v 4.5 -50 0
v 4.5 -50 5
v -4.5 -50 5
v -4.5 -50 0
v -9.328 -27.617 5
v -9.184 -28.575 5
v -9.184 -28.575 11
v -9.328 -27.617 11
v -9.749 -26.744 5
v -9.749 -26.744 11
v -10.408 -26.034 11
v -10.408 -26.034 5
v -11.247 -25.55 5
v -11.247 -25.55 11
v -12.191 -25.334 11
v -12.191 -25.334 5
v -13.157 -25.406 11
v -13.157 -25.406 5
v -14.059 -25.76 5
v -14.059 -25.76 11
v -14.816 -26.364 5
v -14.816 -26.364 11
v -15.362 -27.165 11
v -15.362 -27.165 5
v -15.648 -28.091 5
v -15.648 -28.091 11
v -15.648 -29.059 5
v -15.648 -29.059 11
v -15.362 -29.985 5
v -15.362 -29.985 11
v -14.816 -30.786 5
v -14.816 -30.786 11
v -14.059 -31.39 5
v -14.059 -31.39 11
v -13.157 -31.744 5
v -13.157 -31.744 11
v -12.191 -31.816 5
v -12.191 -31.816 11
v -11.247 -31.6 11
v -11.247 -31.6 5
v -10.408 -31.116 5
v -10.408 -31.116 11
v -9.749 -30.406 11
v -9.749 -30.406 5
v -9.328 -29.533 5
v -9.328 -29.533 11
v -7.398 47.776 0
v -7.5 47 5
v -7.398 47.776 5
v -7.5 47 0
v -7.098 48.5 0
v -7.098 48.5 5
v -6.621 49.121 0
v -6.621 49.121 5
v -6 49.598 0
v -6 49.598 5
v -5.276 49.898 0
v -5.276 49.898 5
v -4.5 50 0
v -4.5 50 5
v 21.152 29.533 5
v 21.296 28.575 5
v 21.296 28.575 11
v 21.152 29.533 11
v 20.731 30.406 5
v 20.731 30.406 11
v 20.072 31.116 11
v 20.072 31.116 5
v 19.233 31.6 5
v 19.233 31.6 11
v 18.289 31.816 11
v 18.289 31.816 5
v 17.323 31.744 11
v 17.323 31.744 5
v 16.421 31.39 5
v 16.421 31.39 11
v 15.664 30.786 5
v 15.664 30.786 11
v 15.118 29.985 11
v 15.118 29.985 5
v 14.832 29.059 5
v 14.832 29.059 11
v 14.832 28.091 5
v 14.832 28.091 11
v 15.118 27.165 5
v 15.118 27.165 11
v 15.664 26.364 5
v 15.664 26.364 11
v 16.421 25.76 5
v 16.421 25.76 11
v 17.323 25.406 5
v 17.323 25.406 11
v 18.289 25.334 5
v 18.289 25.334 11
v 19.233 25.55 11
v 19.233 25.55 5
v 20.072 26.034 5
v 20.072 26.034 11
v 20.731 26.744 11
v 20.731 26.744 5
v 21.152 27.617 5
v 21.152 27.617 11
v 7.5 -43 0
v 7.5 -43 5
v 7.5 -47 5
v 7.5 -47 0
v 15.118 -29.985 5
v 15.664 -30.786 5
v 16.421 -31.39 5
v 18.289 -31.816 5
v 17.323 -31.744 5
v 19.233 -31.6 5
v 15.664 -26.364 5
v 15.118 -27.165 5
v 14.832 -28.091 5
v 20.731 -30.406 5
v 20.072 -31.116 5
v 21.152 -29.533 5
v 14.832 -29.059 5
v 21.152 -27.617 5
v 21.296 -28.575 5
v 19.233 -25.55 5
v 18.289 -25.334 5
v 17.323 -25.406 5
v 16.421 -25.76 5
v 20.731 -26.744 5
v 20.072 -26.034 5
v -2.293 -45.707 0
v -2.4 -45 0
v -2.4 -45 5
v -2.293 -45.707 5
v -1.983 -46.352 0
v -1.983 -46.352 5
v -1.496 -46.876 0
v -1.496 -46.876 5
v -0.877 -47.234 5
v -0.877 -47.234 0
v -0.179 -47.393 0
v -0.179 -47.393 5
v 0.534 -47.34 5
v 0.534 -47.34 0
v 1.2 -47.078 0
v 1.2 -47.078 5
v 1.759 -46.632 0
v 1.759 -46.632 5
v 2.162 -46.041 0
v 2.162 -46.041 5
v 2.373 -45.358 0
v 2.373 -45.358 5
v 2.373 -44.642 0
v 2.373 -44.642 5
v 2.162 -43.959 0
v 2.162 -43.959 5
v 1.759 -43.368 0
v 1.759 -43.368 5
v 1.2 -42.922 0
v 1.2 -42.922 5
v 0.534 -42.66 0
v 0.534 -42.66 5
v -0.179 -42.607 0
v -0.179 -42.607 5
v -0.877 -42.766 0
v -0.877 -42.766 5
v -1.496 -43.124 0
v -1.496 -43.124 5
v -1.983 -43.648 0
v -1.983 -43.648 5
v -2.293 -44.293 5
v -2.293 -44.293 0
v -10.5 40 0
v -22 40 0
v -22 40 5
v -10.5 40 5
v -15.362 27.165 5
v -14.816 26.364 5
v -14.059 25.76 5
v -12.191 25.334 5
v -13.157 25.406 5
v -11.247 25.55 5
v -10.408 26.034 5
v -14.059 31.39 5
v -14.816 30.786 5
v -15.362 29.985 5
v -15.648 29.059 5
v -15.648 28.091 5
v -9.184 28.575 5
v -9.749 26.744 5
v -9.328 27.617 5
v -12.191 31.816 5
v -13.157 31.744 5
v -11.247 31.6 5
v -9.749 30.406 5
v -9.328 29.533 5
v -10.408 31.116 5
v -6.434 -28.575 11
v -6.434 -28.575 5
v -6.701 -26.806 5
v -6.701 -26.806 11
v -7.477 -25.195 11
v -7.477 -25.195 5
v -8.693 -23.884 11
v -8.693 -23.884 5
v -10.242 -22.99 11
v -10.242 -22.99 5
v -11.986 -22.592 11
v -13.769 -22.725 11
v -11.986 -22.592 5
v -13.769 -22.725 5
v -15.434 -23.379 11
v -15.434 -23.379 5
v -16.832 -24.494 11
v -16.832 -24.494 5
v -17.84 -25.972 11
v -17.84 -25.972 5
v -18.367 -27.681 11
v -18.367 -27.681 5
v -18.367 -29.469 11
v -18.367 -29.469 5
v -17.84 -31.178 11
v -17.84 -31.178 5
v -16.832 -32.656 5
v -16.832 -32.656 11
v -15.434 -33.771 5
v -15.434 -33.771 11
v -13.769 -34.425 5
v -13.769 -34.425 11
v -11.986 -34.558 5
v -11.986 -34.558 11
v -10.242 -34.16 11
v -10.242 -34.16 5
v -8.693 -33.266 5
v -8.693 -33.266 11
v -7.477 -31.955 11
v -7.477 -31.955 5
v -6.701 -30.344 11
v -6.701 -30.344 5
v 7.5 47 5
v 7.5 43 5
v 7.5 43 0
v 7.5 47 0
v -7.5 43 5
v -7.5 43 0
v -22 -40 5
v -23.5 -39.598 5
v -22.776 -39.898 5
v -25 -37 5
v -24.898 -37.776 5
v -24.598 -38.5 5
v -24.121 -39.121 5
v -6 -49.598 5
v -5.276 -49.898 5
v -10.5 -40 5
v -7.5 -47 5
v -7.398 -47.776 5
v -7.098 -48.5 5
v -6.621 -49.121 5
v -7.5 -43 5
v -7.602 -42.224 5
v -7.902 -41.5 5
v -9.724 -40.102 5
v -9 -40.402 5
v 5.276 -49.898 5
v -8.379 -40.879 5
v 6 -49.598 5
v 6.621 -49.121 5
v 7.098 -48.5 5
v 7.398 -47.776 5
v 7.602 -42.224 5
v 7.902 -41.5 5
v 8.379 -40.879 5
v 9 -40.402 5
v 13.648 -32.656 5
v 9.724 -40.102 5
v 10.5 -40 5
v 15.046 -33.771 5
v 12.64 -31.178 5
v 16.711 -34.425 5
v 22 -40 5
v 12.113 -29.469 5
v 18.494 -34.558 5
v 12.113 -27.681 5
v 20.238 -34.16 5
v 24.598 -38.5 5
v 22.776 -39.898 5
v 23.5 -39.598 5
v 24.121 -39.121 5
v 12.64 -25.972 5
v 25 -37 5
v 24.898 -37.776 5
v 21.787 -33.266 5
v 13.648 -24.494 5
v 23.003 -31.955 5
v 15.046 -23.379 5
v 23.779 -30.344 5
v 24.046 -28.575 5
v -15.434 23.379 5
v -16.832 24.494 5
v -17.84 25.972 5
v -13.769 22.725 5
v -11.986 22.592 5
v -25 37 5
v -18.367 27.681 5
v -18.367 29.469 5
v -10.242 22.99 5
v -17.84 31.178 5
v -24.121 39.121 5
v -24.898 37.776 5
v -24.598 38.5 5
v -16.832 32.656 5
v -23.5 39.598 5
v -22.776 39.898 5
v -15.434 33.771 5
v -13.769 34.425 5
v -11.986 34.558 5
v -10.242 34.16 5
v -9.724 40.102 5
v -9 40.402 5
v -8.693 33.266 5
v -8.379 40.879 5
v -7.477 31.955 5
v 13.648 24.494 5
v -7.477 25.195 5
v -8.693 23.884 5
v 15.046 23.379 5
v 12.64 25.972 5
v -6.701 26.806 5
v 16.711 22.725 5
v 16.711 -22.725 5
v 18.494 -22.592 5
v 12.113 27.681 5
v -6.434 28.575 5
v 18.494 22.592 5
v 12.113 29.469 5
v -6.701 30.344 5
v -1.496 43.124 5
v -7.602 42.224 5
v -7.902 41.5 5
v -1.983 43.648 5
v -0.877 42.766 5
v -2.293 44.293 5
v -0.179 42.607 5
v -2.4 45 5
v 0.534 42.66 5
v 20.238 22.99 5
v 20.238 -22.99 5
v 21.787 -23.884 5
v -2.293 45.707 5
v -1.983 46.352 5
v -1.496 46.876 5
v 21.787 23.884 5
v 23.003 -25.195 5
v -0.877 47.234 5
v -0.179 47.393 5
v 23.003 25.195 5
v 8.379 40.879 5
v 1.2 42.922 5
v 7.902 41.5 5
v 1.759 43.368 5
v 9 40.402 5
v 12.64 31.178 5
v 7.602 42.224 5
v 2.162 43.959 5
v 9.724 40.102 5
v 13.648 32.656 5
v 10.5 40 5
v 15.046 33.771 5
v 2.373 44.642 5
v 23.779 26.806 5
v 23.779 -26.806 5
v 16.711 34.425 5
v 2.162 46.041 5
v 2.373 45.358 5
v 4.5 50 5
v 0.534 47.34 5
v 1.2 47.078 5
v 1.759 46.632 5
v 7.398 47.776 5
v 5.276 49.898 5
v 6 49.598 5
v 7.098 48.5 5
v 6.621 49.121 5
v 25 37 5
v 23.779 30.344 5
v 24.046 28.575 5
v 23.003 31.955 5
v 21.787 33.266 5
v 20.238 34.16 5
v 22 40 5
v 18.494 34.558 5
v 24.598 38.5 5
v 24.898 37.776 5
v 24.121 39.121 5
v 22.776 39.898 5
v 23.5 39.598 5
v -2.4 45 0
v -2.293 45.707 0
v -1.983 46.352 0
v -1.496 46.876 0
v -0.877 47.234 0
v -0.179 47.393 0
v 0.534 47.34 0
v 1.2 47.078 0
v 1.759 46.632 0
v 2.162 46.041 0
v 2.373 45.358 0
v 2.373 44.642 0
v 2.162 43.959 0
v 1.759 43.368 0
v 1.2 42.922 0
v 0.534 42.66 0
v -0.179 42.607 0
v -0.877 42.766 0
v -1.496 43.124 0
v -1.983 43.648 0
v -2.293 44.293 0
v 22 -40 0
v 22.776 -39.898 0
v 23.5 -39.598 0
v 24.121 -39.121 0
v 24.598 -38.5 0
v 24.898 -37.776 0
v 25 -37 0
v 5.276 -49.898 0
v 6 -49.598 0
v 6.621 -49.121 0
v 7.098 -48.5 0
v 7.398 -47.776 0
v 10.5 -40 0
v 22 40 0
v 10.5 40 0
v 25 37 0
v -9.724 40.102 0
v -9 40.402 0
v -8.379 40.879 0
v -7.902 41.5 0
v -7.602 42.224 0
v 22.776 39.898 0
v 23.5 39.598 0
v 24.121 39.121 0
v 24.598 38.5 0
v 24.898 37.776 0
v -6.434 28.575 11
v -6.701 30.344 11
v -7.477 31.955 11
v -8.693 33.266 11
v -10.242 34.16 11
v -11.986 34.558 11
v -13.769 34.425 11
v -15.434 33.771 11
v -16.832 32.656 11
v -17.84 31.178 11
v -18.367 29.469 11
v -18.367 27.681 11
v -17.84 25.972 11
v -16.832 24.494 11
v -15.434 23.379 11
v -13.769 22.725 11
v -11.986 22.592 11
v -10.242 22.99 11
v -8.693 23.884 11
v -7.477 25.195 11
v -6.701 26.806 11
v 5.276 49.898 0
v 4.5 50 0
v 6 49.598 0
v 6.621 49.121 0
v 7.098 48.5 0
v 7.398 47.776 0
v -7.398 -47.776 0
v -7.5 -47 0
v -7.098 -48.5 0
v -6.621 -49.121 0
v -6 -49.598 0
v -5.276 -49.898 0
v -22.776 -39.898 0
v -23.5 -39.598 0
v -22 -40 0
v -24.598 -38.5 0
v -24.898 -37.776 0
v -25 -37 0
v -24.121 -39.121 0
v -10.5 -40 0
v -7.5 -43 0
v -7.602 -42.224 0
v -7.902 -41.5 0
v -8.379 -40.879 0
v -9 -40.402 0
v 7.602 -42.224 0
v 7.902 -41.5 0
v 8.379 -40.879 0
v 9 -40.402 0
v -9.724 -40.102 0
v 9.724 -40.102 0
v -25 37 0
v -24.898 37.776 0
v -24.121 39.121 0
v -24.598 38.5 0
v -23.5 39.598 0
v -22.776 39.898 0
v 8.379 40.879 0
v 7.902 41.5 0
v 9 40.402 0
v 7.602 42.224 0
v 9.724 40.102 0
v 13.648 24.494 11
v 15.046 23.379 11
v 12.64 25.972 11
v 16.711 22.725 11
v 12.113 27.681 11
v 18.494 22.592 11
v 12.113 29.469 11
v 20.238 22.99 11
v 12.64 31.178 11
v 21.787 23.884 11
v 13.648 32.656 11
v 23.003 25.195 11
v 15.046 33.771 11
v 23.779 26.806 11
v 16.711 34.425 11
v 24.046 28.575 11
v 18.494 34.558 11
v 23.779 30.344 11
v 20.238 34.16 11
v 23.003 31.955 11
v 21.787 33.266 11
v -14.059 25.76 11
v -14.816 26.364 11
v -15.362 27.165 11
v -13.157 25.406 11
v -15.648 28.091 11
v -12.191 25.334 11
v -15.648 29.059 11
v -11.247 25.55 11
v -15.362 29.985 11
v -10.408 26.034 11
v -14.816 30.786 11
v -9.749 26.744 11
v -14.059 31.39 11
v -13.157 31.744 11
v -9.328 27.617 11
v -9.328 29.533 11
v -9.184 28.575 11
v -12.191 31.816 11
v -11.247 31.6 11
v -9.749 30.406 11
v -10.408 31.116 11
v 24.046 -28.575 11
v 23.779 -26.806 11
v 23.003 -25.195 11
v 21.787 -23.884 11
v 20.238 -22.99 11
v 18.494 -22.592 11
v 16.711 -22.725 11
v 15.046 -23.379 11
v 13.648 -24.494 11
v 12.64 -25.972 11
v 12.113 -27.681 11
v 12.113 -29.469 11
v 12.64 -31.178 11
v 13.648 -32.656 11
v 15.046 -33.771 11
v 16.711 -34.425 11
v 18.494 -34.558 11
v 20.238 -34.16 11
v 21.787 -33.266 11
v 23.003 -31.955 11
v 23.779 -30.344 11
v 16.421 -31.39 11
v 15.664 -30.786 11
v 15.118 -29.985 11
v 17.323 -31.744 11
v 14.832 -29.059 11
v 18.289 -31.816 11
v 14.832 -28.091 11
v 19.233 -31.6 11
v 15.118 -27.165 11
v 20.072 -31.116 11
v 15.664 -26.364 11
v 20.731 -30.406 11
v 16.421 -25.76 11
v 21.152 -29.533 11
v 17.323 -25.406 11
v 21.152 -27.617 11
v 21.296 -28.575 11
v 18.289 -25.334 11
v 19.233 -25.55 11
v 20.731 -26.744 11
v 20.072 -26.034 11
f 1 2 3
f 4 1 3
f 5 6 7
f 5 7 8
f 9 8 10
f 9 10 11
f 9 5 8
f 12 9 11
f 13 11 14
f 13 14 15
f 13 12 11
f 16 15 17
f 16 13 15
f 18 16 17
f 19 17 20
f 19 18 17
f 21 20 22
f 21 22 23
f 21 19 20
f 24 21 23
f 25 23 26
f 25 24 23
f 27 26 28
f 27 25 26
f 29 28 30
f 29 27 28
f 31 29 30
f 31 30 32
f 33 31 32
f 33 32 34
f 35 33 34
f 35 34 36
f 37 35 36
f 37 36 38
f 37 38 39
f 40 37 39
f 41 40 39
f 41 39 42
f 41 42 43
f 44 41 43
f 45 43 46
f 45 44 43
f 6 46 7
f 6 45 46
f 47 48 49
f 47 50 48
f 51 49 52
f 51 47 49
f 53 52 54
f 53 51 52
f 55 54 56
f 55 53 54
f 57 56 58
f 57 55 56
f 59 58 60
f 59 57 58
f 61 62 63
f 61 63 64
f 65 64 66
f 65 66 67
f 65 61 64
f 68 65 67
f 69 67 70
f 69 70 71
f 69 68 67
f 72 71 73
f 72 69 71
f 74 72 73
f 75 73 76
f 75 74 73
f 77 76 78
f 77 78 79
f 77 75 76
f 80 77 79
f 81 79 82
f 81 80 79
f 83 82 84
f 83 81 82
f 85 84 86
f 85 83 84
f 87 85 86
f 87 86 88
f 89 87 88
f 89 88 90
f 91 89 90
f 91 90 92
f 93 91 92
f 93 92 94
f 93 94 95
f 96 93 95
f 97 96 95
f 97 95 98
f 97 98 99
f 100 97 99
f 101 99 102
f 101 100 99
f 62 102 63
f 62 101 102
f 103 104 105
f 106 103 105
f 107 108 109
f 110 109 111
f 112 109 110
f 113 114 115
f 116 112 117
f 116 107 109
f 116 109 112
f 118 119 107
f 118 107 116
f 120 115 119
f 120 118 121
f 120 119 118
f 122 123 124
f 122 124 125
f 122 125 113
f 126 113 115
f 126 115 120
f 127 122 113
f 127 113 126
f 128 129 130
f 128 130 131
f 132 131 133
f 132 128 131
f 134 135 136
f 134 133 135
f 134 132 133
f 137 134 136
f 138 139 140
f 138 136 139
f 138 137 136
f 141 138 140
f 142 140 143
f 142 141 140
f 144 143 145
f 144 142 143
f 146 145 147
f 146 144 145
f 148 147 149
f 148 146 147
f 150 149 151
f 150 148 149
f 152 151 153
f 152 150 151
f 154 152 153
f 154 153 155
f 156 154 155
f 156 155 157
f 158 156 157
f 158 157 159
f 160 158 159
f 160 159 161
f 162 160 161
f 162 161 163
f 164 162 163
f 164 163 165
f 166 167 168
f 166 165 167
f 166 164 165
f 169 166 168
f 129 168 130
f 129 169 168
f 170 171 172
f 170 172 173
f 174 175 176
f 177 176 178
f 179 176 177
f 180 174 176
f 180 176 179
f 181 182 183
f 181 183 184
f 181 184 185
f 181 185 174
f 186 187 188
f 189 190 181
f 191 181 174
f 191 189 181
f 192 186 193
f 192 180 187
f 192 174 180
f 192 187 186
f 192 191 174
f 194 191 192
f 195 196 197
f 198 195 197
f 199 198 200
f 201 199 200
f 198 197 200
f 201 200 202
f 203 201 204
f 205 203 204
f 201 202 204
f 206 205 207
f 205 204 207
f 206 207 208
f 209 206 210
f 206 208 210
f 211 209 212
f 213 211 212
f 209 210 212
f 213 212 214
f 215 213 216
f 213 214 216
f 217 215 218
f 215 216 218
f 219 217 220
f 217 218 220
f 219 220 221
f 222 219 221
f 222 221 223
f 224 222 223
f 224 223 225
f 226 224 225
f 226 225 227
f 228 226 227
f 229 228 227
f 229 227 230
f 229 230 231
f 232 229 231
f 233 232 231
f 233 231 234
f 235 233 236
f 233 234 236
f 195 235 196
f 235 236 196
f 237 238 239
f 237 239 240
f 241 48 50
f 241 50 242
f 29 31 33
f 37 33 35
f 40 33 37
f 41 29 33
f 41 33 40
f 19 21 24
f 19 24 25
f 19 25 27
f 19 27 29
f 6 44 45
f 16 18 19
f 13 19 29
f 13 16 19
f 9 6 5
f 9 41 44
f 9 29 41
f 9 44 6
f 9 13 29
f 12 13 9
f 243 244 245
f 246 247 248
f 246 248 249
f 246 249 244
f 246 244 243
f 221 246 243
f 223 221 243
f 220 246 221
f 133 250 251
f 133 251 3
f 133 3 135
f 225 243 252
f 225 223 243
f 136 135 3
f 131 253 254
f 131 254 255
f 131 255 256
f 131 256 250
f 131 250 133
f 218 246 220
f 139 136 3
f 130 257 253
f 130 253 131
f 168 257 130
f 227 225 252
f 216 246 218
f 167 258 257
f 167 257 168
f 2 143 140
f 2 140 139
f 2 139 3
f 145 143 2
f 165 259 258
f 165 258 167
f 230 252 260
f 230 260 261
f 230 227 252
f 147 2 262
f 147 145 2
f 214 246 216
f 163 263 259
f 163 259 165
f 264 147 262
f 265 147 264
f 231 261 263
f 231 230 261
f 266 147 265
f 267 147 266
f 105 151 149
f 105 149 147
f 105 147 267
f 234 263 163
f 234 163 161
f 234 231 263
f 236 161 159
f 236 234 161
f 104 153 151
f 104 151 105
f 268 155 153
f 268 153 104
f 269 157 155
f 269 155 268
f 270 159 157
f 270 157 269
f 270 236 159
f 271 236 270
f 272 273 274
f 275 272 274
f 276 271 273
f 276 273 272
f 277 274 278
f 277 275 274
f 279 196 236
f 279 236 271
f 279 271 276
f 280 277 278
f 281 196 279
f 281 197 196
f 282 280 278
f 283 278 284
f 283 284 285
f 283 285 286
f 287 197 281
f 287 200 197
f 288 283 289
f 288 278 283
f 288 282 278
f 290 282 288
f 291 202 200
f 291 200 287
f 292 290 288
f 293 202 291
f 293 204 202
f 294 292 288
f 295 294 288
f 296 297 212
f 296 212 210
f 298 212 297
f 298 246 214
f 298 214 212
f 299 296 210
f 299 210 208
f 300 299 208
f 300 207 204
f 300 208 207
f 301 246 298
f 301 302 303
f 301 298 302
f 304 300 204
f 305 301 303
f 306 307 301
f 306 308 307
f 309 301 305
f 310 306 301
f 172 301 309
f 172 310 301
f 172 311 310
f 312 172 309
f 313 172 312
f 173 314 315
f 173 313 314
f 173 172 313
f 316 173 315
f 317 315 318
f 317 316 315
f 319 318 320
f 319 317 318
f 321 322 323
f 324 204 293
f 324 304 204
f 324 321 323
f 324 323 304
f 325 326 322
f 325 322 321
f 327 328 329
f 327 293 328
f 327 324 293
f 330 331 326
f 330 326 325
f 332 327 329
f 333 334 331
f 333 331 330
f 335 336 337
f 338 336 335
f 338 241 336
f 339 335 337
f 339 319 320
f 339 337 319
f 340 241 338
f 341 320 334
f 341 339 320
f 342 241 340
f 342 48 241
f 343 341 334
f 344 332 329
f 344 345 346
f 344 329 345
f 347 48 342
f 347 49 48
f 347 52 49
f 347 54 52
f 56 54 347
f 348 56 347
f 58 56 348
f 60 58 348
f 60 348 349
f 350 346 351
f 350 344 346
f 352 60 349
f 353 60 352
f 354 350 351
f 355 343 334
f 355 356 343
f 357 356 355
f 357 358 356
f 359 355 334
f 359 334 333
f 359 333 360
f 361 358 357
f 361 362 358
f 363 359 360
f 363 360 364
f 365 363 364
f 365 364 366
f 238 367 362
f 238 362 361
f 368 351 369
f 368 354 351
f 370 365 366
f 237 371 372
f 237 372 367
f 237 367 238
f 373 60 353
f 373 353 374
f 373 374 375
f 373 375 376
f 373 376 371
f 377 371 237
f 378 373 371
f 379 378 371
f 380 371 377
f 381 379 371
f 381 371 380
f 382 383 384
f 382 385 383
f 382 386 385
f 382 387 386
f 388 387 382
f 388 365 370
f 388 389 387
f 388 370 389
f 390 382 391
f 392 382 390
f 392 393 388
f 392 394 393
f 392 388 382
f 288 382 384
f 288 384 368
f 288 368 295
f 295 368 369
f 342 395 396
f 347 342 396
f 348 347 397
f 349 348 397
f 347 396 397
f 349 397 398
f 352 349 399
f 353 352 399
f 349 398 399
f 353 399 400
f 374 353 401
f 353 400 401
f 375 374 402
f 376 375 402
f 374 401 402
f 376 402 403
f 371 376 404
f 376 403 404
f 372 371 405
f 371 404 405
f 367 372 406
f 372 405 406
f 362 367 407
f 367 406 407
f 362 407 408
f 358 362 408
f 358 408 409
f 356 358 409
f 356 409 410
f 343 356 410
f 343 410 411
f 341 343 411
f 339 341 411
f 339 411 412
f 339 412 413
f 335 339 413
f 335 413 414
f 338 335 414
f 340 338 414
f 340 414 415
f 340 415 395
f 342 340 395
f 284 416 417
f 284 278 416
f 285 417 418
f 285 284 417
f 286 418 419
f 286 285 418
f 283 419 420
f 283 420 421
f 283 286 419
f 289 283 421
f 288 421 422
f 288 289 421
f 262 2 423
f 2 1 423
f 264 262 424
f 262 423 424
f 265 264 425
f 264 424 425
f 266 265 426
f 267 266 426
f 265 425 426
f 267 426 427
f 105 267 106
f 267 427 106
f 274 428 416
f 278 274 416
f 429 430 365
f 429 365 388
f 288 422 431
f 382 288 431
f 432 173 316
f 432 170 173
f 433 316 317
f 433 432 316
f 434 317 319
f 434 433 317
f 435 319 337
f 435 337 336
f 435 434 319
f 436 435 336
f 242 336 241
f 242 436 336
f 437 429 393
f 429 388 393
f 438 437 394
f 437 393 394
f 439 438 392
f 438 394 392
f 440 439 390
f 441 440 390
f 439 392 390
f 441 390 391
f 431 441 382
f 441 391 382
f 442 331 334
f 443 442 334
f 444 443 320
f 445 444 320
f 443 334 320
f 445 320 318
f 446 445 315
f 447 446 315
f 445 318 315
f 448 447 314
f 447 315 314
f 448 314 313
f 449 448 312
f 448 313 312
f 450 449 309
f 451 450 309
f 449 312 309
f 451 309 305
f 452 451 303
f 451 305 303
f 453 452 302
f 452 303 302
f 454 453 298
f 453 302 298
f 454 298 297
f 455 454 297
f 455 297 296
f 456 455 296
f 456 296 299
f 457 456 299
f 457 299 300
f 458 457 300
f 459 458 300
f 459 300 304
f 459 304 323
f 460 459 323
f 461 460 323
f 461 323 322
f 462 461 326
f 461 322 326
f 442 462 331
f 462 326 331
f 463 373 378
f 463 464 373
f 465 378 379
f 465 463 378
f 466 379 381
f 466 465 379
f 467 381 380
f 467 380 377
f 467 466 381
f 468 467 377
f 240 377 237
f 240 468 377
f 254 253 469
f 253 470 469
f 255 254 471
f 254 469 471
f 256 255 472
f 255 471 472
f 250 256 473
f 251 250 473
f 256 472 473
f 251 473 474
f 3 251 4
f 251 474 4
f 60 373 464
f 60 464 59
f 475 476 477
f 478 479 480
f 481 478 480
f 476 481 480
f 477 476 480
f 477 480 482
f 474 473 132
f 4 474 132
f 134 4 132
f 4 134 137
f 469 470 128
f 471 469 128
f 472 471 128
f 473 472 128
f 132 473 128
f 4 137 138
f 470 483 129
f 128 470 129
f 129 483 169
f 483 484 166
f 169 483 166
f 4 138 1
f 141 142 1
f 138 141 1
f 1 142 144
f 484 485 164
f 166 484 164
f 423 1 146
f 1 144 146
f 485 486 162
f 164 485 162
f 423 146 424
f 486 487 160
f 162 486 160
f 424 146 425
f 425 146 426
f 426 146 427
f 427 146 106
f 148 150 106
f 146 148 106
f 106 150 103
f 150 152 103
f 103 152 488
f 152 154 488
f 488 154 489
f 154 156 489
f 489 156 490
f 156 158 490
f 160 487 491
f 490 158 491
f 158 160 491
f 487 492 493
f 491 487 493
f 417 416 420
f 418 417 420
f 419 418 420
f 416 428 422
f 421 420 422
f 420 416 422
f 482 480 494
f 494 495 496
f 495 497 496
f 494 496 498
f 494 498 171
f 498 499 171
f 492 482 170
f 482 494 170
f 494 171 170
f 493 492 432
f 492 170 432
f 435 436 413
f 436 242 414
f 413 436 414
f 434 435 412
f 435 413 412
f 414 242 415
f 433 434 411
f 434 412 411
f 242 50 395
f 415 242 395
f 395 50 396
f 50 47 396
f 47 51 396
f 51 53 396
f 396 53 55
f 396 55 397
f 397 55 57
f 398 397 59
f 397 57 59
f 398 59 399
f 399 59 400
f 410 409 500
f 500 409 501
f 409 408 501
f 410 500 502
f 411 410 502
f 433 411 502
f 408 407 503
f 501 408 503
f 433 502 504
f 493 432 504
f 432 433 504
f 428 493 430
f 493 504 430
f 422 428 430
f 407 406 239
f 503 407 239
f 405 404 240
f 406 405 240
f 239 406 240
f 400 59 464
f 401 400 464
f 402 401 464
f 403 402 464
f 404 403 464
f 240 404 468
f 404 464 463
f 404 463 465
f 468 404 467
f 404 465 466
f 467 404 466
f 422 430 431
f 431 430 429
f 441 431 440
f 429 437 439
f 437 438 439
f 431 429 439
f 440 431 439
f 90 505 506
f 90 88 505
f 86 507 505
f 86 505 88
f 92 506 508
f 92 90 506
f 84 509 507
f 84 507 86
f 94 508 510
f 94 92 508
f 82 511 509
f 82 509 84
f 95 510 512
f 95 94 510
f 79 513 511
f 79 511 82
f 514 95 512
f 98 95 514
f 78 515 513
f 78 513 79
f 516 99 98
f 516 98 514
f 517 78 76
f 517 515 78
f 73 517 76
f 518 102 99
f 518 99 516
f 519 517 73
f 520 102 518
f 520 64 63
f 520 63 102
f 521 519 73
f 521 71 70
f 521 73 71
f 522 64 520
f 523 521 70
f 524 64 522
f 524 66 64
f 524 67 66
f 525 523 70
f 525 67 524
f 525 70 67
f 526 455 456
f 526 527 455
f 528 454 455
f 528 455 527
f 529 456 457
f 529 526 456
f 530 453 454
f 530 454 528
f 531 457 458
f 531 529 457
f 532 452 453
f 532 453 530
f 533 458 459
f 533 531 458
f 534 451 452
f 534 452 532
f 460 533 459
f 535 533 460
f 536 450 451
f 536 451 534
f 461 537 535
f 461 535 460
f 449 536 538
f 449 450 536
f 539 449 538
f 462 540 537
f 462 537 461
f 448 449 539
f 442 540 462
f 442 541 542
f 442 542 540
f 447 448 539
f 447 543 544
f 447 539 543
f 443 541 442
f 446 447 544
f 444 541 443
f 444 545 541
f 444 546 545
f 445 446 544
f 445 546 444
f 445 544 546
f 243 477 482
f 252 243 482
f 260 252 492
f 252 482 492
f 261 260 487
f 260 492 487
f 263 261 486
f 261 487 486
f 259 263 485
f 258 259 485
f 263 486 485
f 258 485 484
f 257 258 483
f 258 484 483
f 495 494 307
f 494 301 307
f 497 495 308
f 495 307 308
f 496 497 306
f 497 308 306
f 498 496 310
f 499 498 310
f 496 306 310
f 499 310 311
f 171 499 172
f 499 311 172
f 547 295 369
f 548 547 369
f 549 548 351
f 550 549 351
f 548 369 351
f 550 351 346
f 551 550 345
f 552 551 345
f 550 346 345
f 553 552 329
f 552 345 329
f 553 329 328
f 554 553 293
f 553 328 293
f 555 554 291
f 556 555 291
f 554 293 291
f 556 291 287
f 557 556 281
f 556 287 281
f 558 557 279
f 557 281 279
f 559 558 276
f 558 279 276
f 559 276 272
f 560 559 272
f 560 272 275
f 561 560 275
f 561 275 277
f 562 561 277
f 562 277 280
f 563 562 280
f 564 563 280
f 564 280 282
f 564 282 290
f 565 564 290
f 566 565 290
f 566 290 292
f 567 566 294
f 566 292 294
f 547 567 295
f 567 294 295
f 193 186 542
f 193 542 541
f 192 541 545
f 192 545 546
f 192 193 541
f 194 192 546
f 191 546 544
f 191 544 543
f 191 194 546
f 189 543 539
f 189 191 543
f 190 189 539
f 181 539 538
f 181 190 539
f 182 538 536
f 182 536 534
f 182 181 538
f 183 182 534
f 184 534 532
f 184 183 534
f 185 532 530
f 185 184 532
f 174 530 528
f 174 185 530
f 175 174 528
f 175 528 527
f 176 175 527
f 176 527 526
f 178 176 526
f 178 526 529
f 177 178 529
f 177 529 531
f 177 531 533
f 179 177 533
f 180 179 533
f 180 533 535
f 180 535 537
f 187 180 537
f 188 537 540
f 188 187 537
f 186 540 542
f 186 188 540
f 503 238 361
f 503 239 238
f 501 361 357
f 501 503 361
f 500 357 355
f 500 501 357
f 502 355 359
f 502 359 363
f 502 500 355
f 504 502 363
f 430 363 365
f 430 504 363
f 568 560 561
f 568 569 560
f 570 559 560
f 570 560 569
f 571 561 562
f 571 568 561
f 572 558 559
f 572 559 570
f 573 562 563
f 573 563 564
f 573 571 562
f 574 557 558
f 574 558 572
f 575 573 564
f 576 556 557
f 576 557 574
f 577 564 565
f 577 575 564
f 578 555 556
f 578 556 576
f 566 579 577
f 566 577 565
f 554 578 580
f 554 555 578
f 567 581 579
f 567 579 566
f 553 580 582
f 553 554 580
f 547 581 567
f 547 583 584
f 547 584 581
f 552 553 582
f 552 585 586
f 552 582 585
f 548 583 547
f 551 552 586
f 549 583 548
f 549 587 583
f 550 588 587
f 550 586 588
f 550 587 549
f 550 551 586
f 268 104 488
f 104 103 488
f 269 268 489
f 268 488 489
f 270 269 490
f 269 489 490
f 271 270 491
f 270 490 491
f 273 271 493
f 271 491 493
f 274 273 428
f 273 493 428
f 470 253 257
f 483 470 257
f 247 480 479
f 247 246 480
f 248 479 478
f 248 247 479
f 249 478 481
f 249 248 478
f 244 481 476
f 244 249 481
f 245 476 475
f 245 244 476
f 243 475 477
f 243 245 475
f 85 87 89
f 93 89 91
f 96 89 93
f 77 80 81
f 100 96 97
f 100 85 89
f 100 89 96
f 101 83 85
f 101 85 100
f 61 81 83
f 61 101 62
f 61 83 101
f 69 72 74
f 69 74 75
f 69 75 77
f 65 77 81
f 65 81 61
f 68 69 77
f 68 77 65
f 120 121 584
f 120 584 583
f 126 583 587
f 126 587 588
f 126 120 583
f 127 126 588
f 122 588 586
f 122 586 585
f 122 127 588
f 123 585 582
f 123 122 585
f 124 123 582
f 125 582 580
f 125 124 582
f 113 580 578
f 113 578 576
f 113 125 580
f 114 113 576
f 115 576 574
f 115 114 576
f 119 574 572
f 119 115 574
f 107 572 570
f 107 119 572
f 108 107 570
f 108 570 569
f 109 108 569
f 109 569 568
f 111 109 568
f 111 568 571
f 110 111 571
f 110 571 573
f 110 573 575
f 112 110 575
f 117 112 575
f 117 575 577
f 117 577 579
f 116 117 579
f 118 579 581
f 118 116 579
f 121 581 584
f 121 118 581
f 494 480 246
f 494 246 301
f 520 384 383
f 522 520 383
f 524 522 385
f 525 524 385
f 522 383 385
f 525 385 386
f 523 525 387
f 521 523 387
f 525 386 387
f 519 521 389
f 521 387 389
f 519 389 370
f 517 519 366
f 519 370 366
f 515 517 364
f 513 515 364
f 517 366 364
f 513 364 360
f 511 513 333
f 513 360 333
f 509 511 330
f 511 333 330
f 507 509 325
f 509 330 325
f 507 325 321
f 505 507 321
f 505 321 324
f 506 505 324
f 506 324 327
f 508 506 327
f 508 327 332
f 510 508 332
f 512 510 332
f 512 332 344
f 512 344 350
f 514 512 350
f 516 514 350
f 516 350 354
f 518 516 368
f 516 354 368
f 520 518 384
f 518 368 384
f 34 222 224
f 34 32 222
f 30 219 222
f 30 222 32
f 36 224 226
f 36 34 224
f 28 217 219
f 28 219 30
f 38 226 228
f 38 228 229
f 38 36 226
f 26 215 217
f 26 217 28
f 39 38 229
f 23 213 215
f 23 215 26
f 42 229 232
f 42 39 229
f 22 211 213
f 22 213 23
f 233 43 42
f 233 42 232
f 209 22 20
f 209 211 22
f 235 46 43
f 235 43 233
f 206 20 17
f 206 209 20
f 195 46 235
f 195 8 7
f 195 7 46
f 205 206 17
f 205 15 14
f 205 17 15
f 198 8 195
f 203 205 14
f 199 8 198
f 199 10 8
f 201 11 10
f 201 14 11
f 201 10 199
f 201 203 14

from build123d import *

# Parameters (mm, degrees)
SKETCH3_W            = 50
SKETCH3_H            = 80
BOSS_EXTRUDE1_DEPTH  = 5
SKETCH5_R            = 6
SKETCH5_R_2          = 3.25
BOSS_EXTRUDE2_DEPTH  = 6
BOSS_EXTRUDE3_DEPTH  = 5
M4_CLEARANCE_HOLE1_D = 4.8
FILLET1_R            = 3


with BuildPart() as part:
    # Sketch3 → Boss-Extrude1 (new body)
    with BuildSketch(Plane.XY):
        Rectangle(SKETCH3_W, SKETCH3_H)
    extrude(amount=BOSS_EXTRUDE1_DEPTH)

    # Sketch5 → Boss-Extrude2 (add)
    # profile 1 of 4: a face of its own
    with BuildSketch(Plane.XY.offset(5)):
        with Locations((-12.434, -28.575)):
            Circle(SKETCH5_R)
        with Locations((-12.434, -28.575)):
            Circle(SKETCH5_R_2, mode=Mode.SUBTRACT)
    # profile 2 of 4: a face of its own
    with BuildSketch(Plane.XY.offset(5)):
        with Locations((18.046, -28.575)):
            Circle(SKETCH5_R)
        with Locations((18.046, -28.575)):
            Circle(SKETCH5_R_2, mode=Mode.SUBTRACT)
    # profile 3 of 4: a face of its own
    with BuildSketch(Plane.XY.offset(5)):
        with Locations((-12.434, 28.575)):
            Circle(SKETCH5_R)
        with Locations((-12.434, 28.575)):
            Circle(SKETCH5_R_2, mode=Mode.SUBTRACT)
    # profile 4 of 4: a face of its own
    with BuildSketch(Plane.XY.offset(5)):
        with Locations((18.046, 28.575)):
            Circle(SKETCH5_R)
        with Locations((18.046, 28.575)):
            Circle(SKETCH5_R_2, mode=Mode.SUBTRACT)
    extrude(amount=BOSS_EXTRUDE2_DEPTH)

    # Sketch8 → Boss-Extrude3 (add)
    with BuildSketch(Plane.XY.offset(5)):
        with BuildLine():
            Line((0, 43), (0, 40))
            Line((0, 40), (7.5, 40))
            Line((7.5, 40), (7.5, 50))
            Line((7.5, 50), (0, 50))
            Line((0, 50), (0, 47))
            ThreePointArc((0, 47), (1.414213562, 46.414213562), (2, 45))
            ThreePointArc((2, 45), (1.414213562, 43.585786438), (0, 43))
        make_face()
        with BuildLine():
            Line((-7.5, 50), (-7.5, 40))
            Line((-7.5, 40), (0, 40))
            Line((0, 40), (0, 43))
            ThreePointArc((0, 43), (-2, 45), (0, 47))
            Line((0, 47), (0, 50))
            Line((0, 50), (-7.5, 50))
        make_face()
        with BuildLine():
            ThreePointArc((0, 47), (-2, 45), (0, 43))
            Line((0, 43), (0, 47))
        make_face()
        with BuildLine():
            Line((0, 47), (0, 43))
            ThreePointArc((0, 43), (1.414213562, 43.585786438), (2, 45))
            ThreePointArc((2, 45), (1.414213562, 46.414213562), (0, 47))
        make_face()
    boss_extrude3 = extrude(amount=-BOSS_EXTRUDE3_DEPTH)

    # M4 Clearance Hole1 (through all)
    with Locations(Plane.XY.offset(5)):
        with Locations((0, 45)):
            m4_clearance_hole1 = Hole(M4_CLEARANCE_HOLE1_D / 2)

    # Mirror1: Boss-Extrude3, M4 Clearance Hole1 across plane
    add(boss_extrude3.mirror(Plane.ZX))
    add(m4_clearance_hole1.mirror(Plane.ZX), mode=Mode.SUBTRACT)

    # Fillet1
    fillet1_edges = [part.edges().sort_by_distance(p)[0] for p in [
        (-7.5, 40, 2.5),
        (-7.5, 50, 2.5),
        (7.5, 50, 2.5),
        (7.5, 40, 2.5),
        (-7.5, -50, 2.5),
        (-7.5, -40, 2.5),
        (7.5, -40, 2.5),
        (7.5, -50, 2.5),
        (25, -40, 2.5),
        (-25, -40, 2.5),
        (-25, 40, 2.5),
        (25, 40, 2.5),
    ]]
    fillet(fillet1_edges, radius=FILLET1_R)


solid = part.part
